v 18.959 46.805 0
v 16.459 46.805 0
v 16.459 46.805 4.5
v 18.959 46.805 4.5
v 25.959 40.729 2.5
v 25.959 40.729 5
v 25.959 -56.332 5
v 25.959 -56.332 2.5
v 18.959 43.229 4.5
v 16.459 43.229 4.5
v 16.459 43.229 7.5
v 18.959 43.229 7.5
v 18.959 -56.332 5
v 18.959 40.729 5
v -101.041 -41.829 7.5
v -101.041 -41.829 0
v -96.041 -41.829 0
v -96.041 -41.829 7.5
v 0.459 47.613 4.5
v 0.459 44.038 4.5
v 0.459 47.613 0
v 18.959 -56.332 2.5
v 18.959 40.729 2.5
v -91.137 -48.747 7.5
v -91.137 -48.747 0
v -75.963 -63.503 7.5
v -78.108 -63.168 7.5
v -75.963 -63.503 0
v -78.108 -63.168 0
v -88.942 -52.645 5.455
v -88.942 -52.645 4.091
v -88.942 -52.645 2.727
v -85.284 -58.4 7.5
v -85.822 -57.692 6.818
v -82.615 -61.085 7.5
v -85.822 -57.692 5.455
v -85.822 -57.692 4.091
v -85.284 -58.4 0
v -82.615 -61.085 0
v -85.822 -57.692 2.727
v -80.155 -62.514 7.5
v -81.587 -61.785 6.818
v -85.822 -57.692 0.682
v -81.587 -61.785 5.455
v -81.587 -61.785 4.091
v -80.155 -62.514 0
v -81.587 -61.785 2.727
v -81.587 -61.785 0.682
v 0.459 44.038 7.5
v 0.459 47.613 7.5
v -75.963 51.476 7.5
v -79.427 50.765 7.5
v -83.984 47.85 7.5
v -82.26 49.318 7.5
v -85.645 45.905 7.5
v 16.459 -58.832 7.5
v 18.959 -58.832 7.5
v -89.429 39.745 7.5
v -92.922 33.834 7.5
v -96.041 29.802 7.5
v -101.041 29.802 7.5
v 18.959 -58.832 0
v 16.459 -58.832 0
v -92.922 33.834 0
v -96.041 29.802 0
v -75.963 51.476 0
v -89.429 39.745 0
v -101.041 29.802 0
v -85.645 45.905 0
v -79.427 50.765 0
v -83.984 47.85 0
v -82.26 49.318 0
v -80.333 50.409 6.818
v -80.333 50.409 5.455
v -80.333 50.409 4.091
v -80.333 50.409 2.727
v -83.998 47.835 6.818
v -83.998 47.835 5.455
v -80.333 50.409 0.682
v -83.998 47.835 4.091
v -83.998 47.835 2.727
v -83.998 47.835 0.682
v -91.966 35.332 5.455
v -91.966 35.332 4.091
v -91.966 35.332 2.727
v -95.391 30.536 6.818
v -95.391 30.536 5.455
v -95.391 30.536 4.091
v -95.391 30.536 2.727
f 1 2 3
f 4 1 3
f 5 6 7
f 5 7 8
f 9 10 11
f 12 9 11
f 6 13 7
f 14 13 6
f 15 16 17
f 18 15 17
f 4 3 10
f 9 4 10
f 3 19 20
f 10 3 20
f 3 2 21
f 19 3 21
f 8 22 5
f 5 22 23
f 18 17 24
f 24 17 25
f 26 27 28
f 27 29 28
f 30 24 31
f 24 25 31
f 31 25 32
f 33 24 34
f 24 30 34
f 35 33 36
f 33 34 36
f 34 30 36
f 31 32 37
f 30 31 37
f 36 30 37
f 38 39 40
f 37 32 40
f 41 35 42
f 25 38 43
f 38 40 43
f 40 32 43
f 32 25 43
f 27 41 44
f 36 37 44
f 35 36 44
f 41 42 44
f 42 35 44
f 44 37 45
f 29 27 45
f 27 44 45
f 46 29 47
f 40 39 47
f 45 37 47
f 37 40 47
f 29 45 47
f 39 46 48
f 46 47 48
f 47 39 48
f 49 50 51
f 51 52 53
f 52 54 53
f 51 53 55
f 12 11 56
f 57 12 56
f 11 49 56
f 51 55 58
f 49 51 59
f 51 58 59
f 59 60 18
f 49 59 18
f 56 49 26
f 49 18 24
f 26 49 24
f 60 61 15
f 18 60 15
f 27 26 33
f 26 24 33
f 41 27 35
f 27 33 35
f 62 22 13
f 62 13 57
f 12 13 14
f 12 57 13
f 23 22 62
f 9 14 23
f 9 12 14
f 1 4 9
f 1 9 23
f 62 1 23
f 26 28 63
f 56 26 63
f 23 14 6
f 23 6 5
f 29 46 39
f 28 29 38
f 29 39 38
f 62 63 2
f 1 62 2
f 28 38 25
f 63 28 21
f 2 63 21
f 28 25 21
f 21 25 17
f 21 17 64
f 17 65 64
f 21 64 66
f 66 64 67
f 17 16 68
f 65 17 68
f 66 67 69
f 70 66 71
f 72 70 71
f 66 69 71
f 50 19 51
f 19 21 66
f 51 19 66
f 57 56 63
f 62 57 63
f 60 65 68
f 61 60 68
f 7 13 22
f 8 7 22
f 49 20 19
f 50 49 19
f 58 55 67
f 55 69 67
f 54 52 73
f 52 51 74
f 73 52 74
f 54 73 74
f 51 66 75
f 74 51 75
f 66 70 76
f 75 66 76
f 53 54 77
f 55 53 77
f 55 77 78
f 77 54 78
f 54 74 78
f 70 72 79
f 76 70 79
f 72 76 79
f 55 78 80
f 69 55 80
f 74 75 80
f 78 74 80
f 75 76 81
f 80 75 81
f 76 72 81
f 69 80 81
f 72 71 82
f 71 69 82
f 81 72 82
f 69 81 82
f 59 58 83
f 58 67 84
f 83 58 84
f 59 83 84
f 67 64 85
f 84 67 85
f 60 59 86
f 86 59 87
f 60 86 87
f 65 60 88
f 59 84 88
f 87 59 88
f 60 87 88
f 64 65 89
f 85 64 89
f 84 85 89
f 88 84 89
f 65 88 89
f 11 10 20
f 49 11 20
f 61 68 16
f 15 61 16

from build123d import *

# Parameters (mm, degrees)
STOCK_BATTERY_BASE_1_DEPTH   = 7.5
STOCK_BATTERY_BASE_1_2_DEPTH = 4.5
BOSS_EXTRUDE1_DEPTH          = 2.5
SKETCH2_W                    = 2.5
SKETCH2_H                    = 97.061474856
BOSS_EXTRUDE2_DEPTH          = 7


# Read off the part's stored shape, not the designer's step: Stock-battery base-1
with BuildPart() as part:
    # Stock-battery base-1 outline → Stock-battery base-1 (new body)
    with BuildSketch(Plane.XY):
        with BuildLine():
            Line((16.459100066, -58.832087736), (16.459100066, 43.22938712))
            Line((16.459100066, 43.22938712), (0.459100066, 44.038083245))
            Line((0.459100066, 44.038083245), (0.459100066, 47.61329436))
            Line((0.459100066, 47.61329436), (-75.963345356, 51.475952827))
            add(Edge.make_bspline(
                [(-75.963345356, 51.475952827), (-76.969760945, 51.385311169), (-77.956664013, 51.213742336), (-79.395866789, 50.78571401), (-79.86970863, 50.613871194), (-80.796837185, 50.204577199), (-81.240590365, 49.971323111), (-82.089787414, 49.449496549), (-82.495246976, 49.160946736), (-83.271465049, 48.533739024), (-83.643007435, 48.194375714), (-84.708444042, 47.116795042), (-85.333215001, 46.343374139), (-86.491296884, 44.737676097), (-87.023827607, 43.904896882), (-88.044872363, 42.211012893), (-88.533034054, 41.34968138), (-89.982900727, 38.756279626), (-90.93240726, 37.013628654), (-92.999467157, 33.650383947), (-94.114586107, 32.031232641), (-95.60337212, 30.287705281), (-95.819744565, 30.042891916), (-96.040899934, 29.801740739)],
                knots=[0, 0, 0, 0, 0.0625, 0.0625, 0.09375, 0.09375, 0.125, 0.125, 0.15625, 0.15625, 0.1875, 0.1875, 0.25, 0.25, 0.3125, 0.3125, 0.375, 0.375, 0.5, 0.5, 0.625, 0.625, 0.645748558, 0.645748558, 0.645748558, 0.645748558], degree=3))
            Line((-96.040899934, 29.801740739), (-101.040899934, 29.801740739))
            Line((-101.040899934, 29.801740739), (-101.040899934, -41.829259963))
            Line((-101.040899934, -41.829259963), (-96.040899934, -41.829259963))
            add(Edge.make_bspline(
                [(-96.040899934, -41.829259963), (-95.798899268, -42.093160096), (-95.56197213, -42.362136183), (-94.03954966, -44.156758027), (-92.923608678, -45.792412437), (-90.858487716, -49.170948695), (-89.911065512, -50.914960796), (-88.457766632, -53.51029646), (-87.967520262, -54.371999904), (-86.940892781, -56.06392928), (-86.404912323, -56.894254814), (-85.530671439, -58.091259413), (-85.227414802, -58.482089731), (-84.588818098, -59.241614046), (-84.254184704, -59.609132259), (-83.204929916, -60.651600397), (-82.440569541, -61.270576891), (-81.160629249, -62.042718444), (-80.719255742, -62.269433113), (-79.817314106, -62.660888928), (-79.3554021, -62.826549047), (-77.940467092, -63.243286827), (-76.954208328, -63.414201398), (-75.963345356, -63.503442328)],
                knots=[0.352672192, 0.352672192, 0.352672192, 0.352672192, 0.375, 0.375, 0.5, 0.5, 0.625, 0.625, 0.6875, 0.6875, 0.75, 0.75, 0.78125, 0.78125, 0.8125, 0.8125, 0.875, 0.875, 0.90625, 0.90625, 0.9375, 0.9375, 1, 1, 1, 1], degree=3))
            Line((-75.963345356, -63.503442328), (16.459100066, -58.832087736))
        make_face()
    extrude(amount=STOCK_BATTERY_BASE_1_DEPTH)

    # Stock-battery base-1 2 outline → Stock-battery base-1 2 (add)
    with BuildSketch(Plane.XY):
        Polygon((16.459100066, 43.22938712), (16.459100066, 46.804598235), (0.459100066, 47.61329436), (0.459100066, 44.038083245), align=None)
    extrude(amount=STOCK_BATTERY_BASE_1_2_DEPTH)

    # Sketch1 → Boss-Extrude1 (add)
    with BuildSketch(Plane(origin=(16.459100066, 0, 0), x_dir=(0, 0, -1), z_dir=(1, 0, 0))):
        Polygon((0, -58.832087736), (0, 46.804598235), (-4.5, 46.804598235), (-4.5, 43.22938712), (-7.5, 43.22938712), (-7.5, -58.832087736), align=None)
    extrude(amount=BOSS_EXTRUDE1_DEPTH)

    # Sketch2 → Boss-Extrude2 (add)
    with BuildSketch(Plane(origin=(18.959100066, 0, 0), x_dir=(0, 0, -1), z_dir=(1, 0, 0))):
        with Locations((-3.75, -7.801350308)):
            Rectangle(SKETCH2_W, SKETCH2_H)
    extrude(amount=BOSS_EXTRUDE2_DEPTH)


solid = part.part
